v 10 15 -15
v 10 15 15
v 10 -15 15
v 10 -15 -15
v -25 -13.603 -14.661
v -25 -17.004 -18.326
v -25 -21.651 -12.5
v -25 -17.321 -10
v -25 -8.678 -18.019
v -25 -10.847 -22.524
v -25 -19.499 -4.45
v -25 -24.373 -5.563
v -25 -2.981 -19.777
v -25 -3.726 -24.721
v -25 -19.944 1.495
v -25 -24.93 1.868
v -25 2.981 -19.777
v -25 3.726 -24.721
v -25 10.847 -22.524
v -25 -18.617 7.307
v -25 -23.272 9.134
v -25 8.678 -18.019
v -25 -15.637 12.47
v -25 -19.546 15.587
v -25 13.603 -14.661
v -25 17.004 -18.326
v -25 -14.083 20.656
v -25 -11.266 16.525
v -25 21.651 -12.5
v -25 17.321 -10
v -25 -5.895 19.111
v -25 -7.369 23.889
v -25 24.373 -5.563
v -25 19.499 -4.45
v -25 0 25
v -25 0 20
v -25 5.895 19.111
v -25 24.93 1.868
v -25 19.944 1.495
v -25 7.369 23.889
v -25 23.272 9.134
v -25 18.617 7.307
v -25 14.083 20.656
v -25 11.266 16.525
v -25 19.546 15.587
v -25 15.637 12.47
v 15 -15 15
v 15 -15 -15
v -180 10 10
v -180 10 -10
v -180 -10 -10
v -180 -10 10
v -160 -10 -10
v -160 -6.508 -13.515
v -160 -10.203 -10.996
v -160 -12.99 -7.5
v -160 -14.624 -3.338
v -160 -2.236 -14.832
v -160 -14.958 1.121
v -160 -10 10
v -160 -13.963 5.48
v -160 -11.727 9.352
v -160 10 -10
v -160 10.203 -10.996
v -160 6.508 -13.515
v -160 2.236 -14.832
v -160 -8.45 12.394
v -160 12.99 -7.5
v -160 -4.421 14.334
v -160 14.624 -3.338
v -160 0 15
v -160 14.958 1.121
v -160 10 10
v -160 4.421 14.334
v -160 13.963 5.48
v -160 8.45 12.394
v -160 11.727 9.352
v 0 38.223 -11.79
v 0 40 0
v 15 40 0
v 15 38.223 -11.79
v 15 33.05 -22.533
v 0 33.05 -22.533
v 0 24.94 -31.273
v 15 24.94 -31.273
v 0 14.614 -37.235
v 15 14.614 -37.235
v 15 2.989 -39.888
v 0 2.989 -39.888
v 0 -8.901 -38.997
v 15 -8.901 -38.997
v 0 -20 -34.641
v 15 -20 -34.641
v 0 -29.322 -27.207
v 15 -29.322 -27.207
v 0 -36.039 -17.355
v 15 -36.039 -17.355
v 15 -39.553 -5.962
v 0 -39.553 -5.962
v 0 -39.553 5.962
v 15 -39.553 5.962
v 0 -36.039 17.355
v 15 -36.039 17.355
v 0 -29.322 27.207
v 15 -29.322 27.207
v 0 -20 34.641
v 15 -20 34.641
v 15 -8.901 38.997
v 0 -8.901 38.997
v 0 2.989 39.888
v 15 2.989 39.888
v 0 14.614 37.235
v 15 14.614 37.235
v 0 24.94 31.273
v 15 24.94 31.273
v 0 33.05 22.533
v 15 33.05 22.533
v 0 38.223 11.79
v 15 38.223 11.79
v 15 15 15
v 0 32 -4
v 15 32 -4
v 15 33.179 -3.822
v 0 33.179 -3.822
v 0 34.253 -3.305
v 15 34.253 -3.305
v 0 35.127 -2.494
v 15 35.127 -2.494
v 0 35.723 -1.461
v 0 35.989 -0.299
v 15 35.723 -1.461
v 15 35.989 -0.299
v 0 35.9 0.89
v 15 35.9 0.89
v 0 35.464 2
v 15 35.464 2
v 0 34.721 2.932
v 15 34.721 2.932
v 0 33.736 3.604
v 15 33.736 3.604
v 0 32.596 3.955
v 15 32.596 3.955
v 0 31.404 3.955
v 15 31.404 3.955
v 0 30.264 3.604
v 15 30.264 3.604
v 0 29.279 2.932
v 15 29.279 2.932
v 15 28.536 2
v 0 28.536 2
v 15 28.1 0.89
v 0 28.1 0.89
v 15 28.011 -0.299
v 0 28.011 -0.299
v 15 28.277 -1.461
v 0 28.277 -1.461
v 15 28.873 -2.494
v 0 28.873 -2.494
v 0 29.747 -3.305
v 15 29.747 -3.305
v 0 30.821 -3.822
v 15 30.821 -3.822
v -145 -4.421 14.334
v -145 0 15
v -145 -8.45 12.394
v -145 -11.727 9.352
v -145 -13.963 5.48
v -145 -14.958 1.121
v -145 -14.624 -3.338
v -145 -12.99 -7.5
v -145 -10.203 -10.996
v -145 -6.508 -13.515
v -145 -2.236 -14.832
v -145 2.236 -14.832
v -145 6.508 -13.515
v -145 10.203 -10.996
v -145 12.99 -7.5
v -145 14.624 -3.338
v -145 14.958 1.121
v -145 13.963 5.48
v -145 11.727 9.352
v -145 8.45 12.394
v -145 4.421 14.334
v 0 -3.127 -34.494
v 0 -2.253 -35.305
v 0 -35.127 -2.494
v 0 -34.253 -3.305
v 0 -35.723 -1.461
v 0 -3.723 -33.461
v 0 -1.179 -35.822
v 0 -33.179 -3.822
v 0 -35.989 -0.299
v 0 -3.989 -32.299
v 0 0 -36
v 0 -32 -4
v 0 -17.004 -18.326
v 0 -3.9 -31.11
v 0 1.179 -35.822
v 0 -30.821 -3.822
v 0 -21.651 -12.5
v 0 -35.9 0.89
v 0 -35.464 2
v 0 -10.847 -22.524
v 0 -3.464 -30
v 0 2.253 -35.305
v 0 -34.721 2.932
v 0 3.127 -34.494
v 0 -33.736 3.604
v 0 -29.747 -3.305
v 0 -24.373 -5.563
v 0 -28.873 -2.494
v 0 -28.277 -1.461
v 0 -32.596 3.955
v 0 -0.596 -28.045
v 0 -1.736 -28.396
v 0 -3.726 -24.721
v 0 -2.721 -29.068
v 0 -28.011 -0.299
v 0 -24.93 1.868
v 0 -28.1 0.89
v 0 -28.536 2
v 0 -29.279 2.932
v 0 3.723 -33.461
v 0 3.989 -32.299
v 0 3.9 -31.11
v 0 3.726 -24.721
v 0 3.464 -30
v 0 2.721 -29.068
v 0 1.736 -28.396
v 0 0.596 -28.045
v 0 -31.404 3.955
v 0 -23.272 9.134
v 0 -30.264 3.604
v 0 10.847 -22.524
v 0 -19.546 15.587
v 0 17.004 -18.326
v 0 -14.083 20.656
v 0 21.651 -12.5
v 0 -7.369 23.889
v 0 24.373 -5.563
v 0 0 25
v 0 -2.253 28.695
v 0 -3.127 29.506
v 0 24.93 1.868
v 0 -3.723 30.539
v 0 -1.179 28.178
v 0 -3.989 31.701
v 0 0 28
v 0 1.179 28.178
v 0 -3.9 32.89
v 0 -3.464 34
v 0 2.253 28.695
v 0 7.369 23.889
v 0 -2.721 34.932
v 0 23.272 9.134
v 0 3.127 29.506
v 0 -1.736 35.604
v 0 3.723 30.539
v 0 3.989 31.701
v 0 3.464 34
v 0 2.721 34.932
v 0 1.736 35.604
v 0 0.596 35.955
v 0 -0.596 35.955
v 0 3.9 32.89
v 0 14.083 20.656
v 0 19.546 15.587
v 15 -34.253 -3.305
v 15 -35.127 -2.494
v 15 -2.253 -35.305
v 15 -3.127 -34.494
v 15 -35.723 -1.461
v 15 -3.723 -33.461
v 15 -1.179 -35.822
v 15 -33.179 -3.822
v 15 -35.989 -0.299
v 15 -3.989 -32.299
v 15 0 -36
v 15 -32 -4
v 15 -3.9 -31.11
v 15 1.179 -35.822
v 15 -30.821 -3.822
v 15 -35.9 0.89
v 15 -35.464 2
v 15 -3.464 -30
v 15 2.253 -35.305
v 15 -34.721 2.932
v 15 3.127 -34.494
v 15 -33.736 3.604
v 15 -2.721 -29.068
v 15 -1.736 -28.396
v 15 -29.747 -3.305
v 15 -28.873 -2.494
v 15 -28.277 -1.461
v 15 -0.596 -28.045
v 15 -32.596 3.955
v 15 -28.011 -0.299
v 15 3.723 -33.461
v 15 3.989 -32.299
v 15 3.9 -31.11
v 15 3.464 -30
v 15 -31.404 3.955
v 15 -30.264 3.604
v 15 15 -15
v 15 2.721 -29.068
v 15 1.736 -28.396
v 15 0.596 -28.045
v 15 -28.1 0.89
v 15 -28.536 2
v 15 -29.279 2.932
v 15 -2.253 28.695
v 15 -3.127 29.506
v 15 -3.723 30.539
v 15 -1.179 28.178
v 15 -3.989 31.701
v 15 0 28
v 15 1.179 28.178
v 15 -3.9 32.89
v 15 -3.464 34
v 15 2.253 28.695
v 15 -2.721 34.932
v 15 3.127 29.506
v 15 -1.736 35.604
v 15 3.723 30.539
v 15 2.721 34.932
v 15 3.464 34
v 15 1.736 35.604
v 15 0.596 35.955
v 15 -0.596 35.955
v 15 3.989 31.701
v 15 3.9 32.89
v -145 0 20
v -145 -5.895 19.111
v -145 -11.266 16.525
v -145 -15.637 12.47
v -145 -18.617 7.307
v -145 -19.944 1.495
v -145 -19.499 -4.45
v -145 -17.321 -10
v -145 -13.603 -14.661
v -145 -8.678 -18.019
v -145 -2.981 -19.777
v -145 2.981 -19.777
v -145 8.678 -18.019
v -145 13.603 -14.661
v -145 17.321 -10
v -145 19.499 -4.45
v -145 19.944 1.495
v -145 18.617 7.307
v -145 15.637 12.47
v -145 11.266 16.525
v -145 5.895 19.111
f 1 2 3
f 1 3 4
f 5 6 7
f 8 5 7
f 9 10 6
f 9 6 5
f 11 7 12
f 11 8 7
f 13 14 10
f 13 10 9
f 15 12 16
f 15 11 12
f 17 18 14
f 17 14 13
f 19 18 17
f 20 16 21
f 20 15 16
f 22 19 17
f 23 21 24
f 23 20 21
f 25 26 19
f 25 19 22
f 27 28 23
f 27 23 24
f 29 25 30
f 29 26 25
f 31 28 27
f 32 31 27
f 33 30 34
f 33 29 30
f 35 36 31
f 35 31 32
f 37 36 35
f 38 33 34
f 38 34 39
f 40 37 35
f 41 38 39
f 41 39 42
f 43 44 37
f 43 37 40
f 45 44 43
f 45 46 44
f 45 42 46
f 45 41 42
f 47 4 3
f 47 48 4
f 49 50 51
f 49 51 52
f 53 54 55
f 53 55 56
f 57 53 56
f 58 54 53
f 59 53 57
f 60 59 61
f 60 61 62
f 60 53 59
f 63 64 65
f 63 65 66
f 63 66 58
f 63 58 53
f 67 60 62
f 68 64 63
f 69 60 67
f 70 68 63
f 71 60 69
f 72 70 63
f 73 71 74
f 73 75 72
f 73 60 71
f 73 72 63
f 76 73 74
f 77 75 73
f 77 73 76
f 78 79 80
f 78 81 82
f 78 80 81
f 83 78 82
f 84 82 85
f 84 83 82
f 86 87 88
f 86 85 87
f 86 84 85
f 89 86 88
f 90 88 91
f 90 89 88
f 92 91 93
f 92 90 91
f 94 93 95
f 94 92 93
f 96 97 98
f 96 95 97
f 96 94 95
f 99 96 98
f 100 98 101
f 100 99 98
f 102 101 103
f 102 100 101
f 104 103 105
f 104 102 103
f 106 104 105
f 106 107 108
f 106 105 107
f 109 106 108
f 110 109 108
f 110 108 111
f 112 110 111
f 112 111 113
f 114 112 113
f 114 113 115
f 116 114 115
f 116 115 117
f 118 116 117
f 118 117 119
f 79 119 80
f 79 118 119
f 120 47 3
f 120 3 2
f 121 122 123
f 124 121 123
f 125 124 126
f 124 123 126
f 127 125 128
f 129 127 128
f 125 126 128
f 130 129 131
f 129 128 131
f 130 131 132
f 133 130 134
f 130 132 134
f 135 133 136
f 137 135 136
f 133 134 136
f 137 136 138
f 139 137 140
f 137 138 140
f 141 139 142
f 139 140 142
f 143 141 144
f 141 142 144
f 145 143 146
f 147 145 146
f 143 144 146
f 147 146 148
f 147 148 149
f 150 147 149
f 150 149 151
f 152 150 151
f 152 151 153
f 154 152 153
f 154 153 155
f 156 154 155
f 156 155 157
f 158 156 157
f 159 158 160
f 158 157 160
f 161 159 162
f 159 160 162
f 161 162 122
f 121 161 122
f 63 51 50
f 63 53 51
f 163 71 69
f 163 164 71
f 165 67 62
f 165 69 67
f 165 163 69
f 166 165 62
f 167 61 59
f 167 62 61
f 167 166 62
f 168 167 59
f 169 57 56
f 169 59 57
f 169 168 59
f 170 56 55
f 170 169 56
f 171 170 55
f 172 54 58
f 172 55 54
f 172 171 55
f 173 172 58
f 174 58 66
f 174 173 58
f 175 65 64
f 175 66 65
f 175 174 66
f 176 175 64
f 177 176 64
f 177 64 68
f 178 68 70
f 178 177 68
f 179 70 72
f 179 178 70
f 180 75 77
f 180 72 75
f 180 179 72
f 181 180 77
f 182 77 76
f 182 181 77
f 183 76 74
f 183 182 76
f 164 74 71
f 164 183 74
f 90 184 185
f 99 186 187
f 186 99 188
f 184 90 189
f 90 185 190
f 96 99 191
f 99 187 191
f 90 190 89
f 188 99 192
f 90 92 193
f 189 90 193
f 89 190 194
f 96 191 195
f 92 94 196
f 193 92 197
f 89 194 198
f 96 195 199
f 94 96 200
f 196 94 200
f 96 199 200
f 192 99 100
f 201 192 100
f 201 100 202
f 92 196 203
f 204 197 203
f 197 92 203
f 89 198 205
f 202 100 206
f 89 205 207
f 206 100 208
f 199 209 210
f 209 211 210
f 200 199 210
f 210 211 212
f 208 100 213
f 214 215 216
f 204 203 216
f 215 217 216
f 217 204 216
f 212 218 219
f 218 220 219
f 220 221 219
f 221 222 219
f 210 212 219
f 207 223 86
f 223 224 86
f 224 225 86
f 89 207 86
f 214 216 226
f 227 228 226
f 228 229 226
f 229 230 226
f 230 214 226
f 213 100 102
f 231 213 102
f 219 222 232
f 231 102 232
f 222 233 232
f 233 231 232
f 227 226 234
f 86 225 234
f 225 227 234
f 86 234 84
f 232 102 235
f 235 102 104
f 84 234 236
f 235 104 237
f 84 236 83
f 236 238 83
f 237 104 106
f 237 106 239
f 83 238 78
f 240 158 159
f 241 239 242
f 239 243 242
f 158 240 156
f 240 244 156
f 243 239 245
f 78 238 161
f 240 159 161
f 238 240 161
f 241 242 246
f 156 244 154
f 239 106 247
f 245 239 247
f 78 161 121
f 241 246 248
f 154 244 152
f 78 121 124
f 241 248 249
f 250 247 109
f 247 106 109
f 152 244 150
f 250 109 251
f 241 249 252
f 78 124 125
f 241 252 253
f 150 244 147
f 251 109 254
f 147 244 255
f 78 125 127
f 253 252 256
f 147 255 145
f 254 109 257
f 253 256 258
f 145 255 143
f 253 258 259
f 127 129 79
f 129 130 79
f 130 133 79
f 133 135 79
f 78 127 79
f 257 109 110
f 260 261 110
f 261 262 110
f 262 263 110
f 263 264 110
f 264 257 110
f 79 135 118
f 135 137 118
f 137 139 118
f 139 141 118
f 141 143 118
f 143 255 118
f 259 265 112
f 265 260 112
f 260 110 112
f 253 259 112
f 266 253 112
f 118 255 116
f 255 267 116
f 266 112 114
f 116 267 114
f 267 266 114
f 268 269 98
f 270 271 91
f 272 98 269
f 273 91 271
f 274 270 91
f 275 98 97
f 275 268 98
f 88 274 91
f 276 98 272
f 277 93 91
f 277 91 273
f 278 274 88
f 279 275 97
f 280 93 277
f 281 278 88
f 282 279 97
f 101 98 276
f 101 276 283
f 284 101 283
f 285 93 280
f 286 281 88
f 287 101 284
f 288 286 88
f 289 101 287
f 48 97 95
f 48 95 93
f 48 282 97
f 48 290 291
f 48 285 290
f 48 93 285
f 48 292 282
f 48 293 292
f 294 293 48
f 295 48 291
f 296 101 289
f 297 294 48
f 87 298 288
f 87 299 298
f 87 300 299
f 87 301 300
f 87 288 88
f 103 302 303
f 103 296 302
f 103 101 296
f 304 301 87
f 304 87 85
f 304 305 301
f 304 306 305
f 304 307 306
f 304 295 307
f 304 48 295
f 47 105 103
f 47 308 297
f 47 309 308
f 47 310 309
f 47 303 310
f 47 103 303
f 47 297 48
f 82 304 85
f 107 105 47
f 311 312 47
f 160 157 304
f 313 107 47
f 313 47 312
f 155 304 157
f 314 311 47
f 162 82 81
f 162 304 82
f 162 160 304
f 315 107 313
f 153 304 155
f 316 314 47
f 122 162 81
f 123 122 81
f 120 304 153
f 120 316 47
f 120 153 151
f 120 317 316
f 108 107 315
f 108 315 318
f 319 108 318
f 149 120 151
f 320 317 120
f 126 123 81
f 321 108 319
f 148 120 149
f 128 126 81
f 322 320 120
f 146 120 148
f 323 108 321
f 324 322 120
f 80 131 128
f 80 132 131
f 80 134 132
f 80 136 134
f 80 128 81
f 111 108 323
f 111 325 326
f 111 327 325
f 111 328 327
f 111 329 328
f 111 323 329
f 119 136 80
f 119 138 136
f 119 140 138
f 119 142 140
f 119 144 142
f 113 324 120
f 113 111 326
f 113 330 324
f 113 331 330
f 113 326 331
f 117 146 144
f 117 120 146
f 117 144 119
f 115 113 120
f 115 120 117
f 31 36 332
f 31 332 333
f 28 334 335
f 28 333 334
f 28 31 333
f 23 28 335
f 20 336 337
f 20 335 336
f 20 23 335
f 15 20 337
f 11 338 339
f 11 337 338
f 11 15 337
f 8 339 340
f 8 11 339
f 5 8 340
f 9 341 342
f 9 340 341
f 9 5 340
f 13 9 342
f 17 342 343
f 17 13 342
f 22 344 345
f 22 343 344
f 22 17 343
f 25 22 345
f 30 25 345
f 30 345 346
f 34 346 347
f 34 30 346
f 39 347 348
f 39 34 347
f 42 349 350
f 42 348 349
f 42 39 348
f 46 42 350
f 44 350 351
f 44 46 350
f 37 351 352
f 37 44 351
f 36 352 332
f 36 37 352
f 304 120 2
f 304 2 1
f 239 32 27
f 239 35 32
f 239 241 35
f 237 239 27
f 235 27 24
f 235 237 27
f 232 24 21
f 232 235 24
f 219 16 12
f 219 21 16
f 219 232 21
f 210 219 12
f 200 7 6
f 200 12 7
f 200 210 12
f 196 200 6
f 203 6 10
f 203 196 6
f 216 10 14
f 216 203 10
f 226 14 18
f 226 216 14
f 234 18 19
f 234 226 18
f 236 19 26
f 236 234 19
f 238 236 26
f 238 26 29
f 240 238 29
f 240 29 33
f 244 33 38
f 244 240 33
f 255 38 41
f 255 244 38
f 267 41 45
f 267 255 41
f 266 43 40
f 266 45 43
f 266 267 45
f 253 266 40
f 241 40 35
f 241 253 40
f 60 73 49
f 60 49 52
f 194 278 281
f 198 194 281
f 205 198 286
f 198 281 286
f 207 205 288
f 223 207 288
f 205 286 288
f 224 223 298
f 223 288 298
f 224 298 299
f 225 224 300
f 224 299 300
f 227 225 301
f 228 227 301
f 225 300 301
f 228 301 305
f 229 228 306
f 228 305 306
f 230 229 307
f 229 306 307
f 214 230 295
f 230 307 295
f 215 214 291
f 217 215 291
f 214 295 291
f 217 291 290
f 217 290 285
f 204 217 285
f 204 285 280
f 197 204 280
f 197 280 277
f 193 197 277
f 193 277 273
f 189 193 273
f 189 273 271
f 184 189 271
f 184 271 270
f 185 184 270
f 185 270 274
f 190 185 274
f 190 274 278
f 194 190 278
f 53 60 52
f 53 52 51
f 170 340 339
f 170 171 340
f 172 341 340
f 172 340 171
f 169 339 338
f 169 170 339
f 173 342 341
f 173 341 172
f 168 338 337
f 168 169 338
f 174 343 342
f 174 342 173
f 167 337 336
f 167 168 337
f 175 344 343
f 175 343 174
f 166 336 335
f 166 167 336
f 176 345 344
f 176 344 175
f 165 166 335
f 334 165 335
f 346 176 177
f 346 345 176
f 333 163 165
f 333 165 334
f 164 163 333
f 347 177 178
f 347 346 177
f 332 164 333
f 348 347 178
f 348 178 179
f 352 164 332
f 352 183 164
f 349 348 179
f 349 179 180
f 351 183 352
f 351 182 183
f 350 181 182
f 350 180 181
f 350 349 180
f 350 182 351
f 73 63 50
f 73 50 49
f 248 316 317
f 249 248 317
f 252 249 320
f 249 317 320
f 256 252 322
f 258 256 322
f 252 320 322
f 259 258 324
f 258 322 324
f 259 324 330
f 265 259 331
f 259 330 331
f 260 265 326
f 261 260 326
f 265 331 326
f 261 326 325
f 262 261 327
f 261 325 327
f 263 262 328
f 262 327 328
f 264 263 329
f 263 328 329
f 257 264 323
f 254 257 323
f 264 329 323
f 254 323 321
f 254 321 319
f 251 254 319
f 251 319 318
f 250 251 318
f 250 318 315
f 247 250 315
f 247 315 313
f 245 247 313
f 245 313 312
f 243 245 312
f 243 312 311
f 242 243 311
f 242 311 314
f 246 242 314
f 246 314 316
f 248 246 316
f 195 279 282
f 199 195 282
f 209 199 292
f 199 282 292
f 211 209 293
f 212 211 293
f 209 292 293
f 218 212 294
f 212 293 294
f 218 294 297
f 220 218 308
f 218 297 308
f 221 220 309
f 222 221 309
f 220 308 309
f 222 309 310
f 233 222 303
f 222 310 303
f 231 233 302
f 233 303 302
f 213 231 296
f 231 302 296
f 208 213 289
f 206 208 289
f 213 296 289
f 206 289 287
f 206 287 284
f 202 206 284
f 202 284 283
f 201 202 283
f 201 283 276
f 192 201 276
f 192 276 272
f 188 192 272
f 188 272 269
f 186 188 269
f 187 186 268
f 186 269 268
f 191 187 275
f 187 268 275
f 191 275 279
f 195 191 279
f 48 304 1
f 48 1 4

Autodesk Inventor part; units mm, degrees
ref_plane "YZ Plane" through (0, 0, 0) normal (1, 0, 0) x (0, 1, 0)
ref_plane "XZ Plane" through (0, 0, 0) normal (0, 1, 0) x (-1, 0, 0)
ref_plane "XY Plane" through (0, 0, 0) normal (0, 0, 1) x (1, 0, 0)
sketch "Sketch1" plane through (0, 0, 0) normal (1, 0, 0) x (0, 1, 0)
  circle A0 centre (0, 0) radius 40
  dimension "d0" = 80
extrude "Extrusion1" add sketch "Sketch1" along normal blind 15
sketch "Sketch2" plane through (0, 0, 0) normal (-1, 0, 0) x (0, 0, 1)
  circle A0 centre (0, 0) radius 25
  circle A1 centre (0, 0) radius 40 projected
  dimension "d3" = 50
extrude "Extrusion2" add sketch "Sketch2" along normal blind 25 contours A0
sketch "Sketch3" plane through (-25, 0, 0) normal (-1, 0, 0) x (0, 0, 1)
  circle A0 centre (0, 0) radius 20
  circle A1 centre (0, 0) radius 25 projected
  dimension "d6" = 40
extrude "Extrusion3" add sketch "Sketch3" along normal blind 120 contours A0
sketch "Sketch4" plane through (-145, 0, 0) normal (-1, 0, 0) x (0, 0, 1)
  circle A0 centre (0, 0) radius 15
  circle A1 centre (0, 0) radius 20 projected
  dimension "d9" = 30
extrude "Extrusion4" add sketch "Sketch4" along normal blind 15 contours A0
sketch "Sketch5" plane through (-160, 0, 0) normal (-1, 0, 0) x (0, 0, 1)
  line L0 (-10, 10) -> (10, 10)
  line L1 (10, 10) -> (10, -10)
  line L2 (10, -10) -> (-10, -10)
  line L3 (-10, -10) -> (-10, 10)
  point P0 (0, 0)
  dimension "d12" = 20
  dimension "d13" = 20
  dimension "d14" = 10
  dimension "d15" = 10
extrude "Extrusion5" add sketch "Sketch5" along normal blind 20
sketch "Sketch6" plane through (15, 0, 0) normal (1, 0, 0) x (0, 0, -1)
  line L0 (-15, 15) -> (15, 15)
  line L1 (15, 15) -> (15, -15)
  line L2 (15, -15) -> (-15, -15)
  line L3 (-15, -15) -> (-15, 15)
  point P0 (0, 0)
  point P1 (-15, 0)
  point P2 (0, 15)
  dimension "d18" = 30
  dimension "d19" = 30
  dimension "d20" = 15
  dimension "d21" = 15
extrude "Extrusion6" cut sketch "Sketch6" against normal blind 5
sketch "Sketch7" plane through (15, 0, 0) normal (1, 0, 0) x (0, 0, -1)
  circle A0 centre (0, 32) radius 4
  circle A1 centre (32, 0) radius 4
  circle A2 centre (-32, 0) radius 4
  circle A3 centre (0, -32) radius 4
  circle A4 centre (0, 0) radius 32 construction
  circle A5 centre (0, 0) radius 40 projected
  dimension "d24" = 64
  dimension "d25" = 8
extrude "Extrusion7" cut sketch "Sketch7" against normal through all contours A0 | A1 | A2 | A3
properties part number "DRIVE SHAFT"
